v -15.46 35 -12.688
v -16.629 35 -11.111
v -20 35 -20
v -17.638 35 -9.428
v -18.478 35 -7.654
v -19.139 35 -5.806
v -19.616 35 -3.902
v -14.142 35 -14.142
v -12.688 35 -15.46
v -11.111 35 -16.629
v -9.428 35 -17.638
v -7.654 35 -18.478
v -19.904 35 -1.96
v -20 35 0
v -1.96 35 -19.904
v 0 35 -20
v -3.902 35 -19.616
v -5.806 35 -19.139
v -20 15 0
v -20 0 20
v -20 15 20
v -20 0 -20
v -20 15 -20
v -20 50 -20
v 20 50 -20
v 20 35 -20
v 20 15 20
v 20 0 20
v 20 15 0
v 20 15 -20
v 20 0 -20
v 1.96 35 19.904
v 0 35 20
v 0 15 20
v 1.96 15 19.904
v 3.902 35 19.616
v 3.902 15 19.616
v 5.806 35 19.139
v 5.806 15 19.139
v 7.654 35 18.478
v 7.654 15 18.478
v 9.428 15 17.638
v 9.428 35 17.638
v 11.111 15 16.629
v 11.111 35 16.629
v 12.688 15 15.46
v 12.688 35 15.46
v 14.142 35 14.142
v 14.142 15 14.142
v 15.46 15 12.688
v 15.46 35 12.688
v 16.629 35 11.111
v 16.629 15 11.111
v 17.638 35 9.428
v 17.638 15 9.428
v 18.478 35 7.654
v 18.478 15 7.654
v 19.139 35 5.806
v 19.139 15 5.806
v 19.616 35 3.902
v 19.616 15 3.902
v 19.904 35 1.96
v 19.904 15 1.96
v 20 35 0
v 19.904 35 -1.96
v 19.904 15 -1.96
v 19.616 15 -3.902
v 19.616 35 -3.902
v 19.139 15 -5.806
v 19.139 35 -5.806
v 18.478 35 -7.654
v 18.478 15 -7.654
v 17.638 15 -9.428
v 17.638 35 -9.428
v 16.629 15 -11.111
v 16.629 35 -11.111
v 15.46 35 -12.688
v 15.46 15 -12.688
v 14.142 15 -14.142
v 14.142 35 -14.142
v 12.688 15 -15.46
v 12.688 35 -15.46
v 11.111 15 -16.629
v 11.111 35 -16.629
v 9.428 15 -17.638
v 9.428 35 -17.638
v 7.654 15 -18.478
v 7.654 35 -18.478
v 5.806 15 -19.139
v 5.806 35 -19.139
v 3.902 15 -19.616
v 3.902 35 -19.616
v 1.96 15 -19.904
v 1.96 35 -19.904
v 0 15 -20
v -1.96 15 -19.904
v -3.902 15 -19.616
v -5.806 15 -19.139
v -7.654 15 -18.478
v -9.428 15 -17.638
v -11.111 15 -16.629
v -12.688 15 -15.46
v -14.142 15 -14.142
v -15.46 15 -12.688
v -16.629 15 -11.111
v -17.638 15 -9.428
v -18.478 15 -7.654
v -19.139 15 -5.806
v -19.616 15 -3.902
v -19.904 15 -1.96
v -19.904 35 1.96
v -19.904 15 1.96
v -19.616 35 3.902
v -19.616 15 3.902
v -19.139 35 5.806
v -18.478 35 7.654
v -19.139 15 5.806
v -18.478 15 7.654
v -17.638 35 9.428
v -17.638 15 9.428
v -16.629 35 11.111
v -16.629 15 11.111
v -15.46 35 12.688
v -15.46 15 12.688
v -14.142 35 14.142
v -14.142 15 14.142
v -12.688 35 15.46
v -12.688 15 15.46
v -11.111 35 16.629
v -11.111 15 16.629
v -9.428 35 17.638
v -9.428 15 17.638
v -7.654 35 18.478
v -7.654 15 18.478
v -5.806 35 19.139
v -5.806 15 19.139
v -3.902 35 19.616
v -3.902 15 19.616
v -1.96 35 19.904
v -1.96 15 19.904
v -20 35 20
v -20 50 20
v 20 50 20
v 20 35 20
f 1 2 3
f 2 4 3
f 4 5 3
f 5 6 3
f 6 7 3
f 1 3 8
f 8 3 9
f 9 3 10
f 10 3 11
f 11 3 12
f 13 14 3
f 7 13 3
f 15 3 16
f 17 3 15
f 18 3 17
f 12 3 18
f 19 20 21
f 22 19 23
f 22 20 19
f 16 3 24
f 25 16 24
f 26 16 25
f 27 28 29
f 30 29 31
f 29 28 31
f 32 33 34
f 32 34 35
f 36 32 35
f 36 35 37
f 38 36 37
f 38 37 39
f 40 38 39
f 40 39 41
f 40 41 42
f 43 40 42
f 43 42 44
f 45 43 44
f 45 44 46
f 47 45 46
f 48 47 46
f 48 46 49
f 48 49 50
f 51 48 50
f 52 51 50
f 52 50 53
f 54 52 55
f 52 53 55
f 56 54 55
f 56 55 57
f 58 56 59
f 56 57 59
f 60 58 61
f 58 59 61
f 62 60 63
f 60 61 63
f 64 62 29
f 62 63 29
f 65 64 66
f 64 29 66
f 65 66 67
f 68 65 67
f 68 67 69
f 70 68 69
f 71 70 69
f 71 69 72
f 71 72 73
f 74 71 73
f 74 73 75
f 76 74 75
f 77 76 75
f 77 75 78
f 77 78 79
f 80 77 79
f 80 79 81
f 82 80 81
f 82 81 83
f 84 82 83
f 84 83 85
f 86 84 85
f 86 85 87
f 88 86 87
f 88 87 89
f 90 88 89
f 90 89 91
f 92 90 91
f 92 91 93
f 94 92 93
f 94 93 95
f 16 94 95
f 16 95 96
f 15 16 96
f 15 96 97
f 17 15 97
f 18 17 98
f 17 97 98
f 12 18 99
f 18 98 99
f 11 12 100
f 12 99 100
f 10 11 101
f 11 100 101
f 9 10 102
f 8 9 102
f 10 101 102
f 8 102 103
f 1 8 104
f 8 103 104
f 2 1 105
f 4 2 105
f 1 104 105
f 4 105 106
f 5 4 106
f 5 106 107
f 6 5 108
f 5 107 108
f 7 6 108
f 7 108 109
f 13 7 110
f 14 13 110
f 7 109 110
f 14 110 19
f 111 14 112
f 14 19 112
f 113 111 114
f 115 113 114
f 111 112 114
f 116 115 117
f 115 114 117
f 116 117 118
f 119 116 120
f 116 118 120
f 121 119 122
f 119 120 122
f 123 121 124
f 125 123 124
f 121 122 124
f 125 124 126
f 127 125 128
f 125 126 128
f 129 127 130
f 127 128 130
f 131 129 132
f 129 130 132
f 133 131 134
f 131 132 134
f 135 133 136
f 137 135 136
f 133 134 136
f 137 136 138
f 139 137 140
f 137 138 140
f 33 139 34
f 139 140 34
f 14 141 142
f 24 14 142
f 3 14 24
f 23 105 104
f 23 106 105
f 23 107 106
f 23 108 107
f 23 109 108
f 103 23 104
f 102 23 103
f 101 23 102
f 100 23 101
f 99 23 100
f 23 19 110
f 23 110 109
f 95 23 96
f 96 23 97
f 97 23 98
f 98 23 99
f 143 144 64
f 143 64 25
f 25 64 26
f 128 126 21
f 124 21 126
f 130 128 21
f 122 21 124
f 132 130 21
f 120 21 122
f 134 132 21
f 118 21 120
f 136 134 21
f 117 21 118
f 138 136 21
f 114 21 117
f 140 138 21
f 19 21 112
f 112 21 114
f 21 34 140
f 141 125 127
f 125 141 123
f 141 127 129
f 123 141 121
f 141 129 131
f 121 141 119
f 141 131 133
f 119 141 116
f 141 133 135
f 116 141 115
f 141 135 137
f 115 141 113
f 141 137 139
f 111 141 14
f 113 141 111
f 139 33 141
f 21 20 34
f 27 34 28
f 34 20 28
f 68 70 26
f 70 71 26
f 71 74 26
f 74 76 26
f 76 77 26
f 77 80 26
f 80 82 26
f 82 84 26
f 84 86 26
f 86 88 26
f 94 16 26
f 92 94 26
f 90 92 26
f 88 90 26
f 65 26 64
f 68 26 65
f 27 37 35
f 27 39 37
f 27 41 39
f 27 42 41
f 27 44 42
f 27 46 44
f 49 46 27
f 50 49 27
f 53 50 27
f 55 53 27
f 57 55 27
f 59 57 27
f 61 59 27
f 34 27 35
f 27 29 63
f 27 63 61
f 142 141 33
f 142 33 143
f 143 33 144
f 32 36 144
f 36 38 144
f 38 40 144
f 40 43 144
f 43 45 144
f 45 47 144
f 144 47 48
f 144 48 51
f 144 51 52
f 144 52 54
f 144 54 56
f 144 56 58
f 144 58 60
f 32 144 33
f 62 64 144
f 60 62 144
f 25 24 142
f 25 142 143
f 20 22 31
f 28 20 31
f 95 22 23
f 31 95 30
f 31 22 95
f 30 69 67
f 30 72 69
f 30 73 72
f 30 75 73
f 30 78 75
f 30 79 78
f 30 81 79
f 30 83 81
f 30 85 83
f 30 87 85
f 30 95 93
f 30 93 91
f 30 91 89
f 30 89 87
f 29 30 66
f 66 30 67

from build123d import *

# Parameters (mm, degrees)
SKETCH1_W           = 40
SKETCH1_H           = 40
BOSS_EXTRUDE1_DEPTH = 15
SKETCH2_R           = 20
BOSS_EXTRUDE2_DEPTH = 20
SKETCH3_W           = 40
SKETCH3_H           = 40
BOSS_EXTRUDE3_DEPTH = 15


with BuildPart() as part:
    # Sketch1 → Boss-Extrude1 (new body)
    with BuildSketch(Plane(origin=(0, 0, 0), x_dir=(1, 0, 0), z_dir=(0, 1, 0))):
        Rectangle(SKETCH1_W, SKETCH1_H)
    extrude(amount=BOSS_EXTRUDE1_DEPTH)

    # Sketch2 → Boss-Extrude2 (add)
    with BuildSketch(Plane(origin=(0, 15, 0), x_dir=(1, 0, 0), z_dir=(0, 1, 0))):
        with Locations(Location((0, 0, 0), (0, 0, 270))):
            Circle(SKETCH2_R)
    extrude(amount=BOSS_EXTRUDE2_DEPTH)

    # Sketch3 → Boss-Extrude3 (add)
    with BuildSketch(Plane(origin=(0, 35, 0), x_dir=(1, 0, 0), z_dir=(0, 1, 0))):
        Rectangle(SKETCH3_W, SKETCH3_H)
    extrude(amount=BOSS_EXTRUDE3_DEPTH)


solid = part.part
